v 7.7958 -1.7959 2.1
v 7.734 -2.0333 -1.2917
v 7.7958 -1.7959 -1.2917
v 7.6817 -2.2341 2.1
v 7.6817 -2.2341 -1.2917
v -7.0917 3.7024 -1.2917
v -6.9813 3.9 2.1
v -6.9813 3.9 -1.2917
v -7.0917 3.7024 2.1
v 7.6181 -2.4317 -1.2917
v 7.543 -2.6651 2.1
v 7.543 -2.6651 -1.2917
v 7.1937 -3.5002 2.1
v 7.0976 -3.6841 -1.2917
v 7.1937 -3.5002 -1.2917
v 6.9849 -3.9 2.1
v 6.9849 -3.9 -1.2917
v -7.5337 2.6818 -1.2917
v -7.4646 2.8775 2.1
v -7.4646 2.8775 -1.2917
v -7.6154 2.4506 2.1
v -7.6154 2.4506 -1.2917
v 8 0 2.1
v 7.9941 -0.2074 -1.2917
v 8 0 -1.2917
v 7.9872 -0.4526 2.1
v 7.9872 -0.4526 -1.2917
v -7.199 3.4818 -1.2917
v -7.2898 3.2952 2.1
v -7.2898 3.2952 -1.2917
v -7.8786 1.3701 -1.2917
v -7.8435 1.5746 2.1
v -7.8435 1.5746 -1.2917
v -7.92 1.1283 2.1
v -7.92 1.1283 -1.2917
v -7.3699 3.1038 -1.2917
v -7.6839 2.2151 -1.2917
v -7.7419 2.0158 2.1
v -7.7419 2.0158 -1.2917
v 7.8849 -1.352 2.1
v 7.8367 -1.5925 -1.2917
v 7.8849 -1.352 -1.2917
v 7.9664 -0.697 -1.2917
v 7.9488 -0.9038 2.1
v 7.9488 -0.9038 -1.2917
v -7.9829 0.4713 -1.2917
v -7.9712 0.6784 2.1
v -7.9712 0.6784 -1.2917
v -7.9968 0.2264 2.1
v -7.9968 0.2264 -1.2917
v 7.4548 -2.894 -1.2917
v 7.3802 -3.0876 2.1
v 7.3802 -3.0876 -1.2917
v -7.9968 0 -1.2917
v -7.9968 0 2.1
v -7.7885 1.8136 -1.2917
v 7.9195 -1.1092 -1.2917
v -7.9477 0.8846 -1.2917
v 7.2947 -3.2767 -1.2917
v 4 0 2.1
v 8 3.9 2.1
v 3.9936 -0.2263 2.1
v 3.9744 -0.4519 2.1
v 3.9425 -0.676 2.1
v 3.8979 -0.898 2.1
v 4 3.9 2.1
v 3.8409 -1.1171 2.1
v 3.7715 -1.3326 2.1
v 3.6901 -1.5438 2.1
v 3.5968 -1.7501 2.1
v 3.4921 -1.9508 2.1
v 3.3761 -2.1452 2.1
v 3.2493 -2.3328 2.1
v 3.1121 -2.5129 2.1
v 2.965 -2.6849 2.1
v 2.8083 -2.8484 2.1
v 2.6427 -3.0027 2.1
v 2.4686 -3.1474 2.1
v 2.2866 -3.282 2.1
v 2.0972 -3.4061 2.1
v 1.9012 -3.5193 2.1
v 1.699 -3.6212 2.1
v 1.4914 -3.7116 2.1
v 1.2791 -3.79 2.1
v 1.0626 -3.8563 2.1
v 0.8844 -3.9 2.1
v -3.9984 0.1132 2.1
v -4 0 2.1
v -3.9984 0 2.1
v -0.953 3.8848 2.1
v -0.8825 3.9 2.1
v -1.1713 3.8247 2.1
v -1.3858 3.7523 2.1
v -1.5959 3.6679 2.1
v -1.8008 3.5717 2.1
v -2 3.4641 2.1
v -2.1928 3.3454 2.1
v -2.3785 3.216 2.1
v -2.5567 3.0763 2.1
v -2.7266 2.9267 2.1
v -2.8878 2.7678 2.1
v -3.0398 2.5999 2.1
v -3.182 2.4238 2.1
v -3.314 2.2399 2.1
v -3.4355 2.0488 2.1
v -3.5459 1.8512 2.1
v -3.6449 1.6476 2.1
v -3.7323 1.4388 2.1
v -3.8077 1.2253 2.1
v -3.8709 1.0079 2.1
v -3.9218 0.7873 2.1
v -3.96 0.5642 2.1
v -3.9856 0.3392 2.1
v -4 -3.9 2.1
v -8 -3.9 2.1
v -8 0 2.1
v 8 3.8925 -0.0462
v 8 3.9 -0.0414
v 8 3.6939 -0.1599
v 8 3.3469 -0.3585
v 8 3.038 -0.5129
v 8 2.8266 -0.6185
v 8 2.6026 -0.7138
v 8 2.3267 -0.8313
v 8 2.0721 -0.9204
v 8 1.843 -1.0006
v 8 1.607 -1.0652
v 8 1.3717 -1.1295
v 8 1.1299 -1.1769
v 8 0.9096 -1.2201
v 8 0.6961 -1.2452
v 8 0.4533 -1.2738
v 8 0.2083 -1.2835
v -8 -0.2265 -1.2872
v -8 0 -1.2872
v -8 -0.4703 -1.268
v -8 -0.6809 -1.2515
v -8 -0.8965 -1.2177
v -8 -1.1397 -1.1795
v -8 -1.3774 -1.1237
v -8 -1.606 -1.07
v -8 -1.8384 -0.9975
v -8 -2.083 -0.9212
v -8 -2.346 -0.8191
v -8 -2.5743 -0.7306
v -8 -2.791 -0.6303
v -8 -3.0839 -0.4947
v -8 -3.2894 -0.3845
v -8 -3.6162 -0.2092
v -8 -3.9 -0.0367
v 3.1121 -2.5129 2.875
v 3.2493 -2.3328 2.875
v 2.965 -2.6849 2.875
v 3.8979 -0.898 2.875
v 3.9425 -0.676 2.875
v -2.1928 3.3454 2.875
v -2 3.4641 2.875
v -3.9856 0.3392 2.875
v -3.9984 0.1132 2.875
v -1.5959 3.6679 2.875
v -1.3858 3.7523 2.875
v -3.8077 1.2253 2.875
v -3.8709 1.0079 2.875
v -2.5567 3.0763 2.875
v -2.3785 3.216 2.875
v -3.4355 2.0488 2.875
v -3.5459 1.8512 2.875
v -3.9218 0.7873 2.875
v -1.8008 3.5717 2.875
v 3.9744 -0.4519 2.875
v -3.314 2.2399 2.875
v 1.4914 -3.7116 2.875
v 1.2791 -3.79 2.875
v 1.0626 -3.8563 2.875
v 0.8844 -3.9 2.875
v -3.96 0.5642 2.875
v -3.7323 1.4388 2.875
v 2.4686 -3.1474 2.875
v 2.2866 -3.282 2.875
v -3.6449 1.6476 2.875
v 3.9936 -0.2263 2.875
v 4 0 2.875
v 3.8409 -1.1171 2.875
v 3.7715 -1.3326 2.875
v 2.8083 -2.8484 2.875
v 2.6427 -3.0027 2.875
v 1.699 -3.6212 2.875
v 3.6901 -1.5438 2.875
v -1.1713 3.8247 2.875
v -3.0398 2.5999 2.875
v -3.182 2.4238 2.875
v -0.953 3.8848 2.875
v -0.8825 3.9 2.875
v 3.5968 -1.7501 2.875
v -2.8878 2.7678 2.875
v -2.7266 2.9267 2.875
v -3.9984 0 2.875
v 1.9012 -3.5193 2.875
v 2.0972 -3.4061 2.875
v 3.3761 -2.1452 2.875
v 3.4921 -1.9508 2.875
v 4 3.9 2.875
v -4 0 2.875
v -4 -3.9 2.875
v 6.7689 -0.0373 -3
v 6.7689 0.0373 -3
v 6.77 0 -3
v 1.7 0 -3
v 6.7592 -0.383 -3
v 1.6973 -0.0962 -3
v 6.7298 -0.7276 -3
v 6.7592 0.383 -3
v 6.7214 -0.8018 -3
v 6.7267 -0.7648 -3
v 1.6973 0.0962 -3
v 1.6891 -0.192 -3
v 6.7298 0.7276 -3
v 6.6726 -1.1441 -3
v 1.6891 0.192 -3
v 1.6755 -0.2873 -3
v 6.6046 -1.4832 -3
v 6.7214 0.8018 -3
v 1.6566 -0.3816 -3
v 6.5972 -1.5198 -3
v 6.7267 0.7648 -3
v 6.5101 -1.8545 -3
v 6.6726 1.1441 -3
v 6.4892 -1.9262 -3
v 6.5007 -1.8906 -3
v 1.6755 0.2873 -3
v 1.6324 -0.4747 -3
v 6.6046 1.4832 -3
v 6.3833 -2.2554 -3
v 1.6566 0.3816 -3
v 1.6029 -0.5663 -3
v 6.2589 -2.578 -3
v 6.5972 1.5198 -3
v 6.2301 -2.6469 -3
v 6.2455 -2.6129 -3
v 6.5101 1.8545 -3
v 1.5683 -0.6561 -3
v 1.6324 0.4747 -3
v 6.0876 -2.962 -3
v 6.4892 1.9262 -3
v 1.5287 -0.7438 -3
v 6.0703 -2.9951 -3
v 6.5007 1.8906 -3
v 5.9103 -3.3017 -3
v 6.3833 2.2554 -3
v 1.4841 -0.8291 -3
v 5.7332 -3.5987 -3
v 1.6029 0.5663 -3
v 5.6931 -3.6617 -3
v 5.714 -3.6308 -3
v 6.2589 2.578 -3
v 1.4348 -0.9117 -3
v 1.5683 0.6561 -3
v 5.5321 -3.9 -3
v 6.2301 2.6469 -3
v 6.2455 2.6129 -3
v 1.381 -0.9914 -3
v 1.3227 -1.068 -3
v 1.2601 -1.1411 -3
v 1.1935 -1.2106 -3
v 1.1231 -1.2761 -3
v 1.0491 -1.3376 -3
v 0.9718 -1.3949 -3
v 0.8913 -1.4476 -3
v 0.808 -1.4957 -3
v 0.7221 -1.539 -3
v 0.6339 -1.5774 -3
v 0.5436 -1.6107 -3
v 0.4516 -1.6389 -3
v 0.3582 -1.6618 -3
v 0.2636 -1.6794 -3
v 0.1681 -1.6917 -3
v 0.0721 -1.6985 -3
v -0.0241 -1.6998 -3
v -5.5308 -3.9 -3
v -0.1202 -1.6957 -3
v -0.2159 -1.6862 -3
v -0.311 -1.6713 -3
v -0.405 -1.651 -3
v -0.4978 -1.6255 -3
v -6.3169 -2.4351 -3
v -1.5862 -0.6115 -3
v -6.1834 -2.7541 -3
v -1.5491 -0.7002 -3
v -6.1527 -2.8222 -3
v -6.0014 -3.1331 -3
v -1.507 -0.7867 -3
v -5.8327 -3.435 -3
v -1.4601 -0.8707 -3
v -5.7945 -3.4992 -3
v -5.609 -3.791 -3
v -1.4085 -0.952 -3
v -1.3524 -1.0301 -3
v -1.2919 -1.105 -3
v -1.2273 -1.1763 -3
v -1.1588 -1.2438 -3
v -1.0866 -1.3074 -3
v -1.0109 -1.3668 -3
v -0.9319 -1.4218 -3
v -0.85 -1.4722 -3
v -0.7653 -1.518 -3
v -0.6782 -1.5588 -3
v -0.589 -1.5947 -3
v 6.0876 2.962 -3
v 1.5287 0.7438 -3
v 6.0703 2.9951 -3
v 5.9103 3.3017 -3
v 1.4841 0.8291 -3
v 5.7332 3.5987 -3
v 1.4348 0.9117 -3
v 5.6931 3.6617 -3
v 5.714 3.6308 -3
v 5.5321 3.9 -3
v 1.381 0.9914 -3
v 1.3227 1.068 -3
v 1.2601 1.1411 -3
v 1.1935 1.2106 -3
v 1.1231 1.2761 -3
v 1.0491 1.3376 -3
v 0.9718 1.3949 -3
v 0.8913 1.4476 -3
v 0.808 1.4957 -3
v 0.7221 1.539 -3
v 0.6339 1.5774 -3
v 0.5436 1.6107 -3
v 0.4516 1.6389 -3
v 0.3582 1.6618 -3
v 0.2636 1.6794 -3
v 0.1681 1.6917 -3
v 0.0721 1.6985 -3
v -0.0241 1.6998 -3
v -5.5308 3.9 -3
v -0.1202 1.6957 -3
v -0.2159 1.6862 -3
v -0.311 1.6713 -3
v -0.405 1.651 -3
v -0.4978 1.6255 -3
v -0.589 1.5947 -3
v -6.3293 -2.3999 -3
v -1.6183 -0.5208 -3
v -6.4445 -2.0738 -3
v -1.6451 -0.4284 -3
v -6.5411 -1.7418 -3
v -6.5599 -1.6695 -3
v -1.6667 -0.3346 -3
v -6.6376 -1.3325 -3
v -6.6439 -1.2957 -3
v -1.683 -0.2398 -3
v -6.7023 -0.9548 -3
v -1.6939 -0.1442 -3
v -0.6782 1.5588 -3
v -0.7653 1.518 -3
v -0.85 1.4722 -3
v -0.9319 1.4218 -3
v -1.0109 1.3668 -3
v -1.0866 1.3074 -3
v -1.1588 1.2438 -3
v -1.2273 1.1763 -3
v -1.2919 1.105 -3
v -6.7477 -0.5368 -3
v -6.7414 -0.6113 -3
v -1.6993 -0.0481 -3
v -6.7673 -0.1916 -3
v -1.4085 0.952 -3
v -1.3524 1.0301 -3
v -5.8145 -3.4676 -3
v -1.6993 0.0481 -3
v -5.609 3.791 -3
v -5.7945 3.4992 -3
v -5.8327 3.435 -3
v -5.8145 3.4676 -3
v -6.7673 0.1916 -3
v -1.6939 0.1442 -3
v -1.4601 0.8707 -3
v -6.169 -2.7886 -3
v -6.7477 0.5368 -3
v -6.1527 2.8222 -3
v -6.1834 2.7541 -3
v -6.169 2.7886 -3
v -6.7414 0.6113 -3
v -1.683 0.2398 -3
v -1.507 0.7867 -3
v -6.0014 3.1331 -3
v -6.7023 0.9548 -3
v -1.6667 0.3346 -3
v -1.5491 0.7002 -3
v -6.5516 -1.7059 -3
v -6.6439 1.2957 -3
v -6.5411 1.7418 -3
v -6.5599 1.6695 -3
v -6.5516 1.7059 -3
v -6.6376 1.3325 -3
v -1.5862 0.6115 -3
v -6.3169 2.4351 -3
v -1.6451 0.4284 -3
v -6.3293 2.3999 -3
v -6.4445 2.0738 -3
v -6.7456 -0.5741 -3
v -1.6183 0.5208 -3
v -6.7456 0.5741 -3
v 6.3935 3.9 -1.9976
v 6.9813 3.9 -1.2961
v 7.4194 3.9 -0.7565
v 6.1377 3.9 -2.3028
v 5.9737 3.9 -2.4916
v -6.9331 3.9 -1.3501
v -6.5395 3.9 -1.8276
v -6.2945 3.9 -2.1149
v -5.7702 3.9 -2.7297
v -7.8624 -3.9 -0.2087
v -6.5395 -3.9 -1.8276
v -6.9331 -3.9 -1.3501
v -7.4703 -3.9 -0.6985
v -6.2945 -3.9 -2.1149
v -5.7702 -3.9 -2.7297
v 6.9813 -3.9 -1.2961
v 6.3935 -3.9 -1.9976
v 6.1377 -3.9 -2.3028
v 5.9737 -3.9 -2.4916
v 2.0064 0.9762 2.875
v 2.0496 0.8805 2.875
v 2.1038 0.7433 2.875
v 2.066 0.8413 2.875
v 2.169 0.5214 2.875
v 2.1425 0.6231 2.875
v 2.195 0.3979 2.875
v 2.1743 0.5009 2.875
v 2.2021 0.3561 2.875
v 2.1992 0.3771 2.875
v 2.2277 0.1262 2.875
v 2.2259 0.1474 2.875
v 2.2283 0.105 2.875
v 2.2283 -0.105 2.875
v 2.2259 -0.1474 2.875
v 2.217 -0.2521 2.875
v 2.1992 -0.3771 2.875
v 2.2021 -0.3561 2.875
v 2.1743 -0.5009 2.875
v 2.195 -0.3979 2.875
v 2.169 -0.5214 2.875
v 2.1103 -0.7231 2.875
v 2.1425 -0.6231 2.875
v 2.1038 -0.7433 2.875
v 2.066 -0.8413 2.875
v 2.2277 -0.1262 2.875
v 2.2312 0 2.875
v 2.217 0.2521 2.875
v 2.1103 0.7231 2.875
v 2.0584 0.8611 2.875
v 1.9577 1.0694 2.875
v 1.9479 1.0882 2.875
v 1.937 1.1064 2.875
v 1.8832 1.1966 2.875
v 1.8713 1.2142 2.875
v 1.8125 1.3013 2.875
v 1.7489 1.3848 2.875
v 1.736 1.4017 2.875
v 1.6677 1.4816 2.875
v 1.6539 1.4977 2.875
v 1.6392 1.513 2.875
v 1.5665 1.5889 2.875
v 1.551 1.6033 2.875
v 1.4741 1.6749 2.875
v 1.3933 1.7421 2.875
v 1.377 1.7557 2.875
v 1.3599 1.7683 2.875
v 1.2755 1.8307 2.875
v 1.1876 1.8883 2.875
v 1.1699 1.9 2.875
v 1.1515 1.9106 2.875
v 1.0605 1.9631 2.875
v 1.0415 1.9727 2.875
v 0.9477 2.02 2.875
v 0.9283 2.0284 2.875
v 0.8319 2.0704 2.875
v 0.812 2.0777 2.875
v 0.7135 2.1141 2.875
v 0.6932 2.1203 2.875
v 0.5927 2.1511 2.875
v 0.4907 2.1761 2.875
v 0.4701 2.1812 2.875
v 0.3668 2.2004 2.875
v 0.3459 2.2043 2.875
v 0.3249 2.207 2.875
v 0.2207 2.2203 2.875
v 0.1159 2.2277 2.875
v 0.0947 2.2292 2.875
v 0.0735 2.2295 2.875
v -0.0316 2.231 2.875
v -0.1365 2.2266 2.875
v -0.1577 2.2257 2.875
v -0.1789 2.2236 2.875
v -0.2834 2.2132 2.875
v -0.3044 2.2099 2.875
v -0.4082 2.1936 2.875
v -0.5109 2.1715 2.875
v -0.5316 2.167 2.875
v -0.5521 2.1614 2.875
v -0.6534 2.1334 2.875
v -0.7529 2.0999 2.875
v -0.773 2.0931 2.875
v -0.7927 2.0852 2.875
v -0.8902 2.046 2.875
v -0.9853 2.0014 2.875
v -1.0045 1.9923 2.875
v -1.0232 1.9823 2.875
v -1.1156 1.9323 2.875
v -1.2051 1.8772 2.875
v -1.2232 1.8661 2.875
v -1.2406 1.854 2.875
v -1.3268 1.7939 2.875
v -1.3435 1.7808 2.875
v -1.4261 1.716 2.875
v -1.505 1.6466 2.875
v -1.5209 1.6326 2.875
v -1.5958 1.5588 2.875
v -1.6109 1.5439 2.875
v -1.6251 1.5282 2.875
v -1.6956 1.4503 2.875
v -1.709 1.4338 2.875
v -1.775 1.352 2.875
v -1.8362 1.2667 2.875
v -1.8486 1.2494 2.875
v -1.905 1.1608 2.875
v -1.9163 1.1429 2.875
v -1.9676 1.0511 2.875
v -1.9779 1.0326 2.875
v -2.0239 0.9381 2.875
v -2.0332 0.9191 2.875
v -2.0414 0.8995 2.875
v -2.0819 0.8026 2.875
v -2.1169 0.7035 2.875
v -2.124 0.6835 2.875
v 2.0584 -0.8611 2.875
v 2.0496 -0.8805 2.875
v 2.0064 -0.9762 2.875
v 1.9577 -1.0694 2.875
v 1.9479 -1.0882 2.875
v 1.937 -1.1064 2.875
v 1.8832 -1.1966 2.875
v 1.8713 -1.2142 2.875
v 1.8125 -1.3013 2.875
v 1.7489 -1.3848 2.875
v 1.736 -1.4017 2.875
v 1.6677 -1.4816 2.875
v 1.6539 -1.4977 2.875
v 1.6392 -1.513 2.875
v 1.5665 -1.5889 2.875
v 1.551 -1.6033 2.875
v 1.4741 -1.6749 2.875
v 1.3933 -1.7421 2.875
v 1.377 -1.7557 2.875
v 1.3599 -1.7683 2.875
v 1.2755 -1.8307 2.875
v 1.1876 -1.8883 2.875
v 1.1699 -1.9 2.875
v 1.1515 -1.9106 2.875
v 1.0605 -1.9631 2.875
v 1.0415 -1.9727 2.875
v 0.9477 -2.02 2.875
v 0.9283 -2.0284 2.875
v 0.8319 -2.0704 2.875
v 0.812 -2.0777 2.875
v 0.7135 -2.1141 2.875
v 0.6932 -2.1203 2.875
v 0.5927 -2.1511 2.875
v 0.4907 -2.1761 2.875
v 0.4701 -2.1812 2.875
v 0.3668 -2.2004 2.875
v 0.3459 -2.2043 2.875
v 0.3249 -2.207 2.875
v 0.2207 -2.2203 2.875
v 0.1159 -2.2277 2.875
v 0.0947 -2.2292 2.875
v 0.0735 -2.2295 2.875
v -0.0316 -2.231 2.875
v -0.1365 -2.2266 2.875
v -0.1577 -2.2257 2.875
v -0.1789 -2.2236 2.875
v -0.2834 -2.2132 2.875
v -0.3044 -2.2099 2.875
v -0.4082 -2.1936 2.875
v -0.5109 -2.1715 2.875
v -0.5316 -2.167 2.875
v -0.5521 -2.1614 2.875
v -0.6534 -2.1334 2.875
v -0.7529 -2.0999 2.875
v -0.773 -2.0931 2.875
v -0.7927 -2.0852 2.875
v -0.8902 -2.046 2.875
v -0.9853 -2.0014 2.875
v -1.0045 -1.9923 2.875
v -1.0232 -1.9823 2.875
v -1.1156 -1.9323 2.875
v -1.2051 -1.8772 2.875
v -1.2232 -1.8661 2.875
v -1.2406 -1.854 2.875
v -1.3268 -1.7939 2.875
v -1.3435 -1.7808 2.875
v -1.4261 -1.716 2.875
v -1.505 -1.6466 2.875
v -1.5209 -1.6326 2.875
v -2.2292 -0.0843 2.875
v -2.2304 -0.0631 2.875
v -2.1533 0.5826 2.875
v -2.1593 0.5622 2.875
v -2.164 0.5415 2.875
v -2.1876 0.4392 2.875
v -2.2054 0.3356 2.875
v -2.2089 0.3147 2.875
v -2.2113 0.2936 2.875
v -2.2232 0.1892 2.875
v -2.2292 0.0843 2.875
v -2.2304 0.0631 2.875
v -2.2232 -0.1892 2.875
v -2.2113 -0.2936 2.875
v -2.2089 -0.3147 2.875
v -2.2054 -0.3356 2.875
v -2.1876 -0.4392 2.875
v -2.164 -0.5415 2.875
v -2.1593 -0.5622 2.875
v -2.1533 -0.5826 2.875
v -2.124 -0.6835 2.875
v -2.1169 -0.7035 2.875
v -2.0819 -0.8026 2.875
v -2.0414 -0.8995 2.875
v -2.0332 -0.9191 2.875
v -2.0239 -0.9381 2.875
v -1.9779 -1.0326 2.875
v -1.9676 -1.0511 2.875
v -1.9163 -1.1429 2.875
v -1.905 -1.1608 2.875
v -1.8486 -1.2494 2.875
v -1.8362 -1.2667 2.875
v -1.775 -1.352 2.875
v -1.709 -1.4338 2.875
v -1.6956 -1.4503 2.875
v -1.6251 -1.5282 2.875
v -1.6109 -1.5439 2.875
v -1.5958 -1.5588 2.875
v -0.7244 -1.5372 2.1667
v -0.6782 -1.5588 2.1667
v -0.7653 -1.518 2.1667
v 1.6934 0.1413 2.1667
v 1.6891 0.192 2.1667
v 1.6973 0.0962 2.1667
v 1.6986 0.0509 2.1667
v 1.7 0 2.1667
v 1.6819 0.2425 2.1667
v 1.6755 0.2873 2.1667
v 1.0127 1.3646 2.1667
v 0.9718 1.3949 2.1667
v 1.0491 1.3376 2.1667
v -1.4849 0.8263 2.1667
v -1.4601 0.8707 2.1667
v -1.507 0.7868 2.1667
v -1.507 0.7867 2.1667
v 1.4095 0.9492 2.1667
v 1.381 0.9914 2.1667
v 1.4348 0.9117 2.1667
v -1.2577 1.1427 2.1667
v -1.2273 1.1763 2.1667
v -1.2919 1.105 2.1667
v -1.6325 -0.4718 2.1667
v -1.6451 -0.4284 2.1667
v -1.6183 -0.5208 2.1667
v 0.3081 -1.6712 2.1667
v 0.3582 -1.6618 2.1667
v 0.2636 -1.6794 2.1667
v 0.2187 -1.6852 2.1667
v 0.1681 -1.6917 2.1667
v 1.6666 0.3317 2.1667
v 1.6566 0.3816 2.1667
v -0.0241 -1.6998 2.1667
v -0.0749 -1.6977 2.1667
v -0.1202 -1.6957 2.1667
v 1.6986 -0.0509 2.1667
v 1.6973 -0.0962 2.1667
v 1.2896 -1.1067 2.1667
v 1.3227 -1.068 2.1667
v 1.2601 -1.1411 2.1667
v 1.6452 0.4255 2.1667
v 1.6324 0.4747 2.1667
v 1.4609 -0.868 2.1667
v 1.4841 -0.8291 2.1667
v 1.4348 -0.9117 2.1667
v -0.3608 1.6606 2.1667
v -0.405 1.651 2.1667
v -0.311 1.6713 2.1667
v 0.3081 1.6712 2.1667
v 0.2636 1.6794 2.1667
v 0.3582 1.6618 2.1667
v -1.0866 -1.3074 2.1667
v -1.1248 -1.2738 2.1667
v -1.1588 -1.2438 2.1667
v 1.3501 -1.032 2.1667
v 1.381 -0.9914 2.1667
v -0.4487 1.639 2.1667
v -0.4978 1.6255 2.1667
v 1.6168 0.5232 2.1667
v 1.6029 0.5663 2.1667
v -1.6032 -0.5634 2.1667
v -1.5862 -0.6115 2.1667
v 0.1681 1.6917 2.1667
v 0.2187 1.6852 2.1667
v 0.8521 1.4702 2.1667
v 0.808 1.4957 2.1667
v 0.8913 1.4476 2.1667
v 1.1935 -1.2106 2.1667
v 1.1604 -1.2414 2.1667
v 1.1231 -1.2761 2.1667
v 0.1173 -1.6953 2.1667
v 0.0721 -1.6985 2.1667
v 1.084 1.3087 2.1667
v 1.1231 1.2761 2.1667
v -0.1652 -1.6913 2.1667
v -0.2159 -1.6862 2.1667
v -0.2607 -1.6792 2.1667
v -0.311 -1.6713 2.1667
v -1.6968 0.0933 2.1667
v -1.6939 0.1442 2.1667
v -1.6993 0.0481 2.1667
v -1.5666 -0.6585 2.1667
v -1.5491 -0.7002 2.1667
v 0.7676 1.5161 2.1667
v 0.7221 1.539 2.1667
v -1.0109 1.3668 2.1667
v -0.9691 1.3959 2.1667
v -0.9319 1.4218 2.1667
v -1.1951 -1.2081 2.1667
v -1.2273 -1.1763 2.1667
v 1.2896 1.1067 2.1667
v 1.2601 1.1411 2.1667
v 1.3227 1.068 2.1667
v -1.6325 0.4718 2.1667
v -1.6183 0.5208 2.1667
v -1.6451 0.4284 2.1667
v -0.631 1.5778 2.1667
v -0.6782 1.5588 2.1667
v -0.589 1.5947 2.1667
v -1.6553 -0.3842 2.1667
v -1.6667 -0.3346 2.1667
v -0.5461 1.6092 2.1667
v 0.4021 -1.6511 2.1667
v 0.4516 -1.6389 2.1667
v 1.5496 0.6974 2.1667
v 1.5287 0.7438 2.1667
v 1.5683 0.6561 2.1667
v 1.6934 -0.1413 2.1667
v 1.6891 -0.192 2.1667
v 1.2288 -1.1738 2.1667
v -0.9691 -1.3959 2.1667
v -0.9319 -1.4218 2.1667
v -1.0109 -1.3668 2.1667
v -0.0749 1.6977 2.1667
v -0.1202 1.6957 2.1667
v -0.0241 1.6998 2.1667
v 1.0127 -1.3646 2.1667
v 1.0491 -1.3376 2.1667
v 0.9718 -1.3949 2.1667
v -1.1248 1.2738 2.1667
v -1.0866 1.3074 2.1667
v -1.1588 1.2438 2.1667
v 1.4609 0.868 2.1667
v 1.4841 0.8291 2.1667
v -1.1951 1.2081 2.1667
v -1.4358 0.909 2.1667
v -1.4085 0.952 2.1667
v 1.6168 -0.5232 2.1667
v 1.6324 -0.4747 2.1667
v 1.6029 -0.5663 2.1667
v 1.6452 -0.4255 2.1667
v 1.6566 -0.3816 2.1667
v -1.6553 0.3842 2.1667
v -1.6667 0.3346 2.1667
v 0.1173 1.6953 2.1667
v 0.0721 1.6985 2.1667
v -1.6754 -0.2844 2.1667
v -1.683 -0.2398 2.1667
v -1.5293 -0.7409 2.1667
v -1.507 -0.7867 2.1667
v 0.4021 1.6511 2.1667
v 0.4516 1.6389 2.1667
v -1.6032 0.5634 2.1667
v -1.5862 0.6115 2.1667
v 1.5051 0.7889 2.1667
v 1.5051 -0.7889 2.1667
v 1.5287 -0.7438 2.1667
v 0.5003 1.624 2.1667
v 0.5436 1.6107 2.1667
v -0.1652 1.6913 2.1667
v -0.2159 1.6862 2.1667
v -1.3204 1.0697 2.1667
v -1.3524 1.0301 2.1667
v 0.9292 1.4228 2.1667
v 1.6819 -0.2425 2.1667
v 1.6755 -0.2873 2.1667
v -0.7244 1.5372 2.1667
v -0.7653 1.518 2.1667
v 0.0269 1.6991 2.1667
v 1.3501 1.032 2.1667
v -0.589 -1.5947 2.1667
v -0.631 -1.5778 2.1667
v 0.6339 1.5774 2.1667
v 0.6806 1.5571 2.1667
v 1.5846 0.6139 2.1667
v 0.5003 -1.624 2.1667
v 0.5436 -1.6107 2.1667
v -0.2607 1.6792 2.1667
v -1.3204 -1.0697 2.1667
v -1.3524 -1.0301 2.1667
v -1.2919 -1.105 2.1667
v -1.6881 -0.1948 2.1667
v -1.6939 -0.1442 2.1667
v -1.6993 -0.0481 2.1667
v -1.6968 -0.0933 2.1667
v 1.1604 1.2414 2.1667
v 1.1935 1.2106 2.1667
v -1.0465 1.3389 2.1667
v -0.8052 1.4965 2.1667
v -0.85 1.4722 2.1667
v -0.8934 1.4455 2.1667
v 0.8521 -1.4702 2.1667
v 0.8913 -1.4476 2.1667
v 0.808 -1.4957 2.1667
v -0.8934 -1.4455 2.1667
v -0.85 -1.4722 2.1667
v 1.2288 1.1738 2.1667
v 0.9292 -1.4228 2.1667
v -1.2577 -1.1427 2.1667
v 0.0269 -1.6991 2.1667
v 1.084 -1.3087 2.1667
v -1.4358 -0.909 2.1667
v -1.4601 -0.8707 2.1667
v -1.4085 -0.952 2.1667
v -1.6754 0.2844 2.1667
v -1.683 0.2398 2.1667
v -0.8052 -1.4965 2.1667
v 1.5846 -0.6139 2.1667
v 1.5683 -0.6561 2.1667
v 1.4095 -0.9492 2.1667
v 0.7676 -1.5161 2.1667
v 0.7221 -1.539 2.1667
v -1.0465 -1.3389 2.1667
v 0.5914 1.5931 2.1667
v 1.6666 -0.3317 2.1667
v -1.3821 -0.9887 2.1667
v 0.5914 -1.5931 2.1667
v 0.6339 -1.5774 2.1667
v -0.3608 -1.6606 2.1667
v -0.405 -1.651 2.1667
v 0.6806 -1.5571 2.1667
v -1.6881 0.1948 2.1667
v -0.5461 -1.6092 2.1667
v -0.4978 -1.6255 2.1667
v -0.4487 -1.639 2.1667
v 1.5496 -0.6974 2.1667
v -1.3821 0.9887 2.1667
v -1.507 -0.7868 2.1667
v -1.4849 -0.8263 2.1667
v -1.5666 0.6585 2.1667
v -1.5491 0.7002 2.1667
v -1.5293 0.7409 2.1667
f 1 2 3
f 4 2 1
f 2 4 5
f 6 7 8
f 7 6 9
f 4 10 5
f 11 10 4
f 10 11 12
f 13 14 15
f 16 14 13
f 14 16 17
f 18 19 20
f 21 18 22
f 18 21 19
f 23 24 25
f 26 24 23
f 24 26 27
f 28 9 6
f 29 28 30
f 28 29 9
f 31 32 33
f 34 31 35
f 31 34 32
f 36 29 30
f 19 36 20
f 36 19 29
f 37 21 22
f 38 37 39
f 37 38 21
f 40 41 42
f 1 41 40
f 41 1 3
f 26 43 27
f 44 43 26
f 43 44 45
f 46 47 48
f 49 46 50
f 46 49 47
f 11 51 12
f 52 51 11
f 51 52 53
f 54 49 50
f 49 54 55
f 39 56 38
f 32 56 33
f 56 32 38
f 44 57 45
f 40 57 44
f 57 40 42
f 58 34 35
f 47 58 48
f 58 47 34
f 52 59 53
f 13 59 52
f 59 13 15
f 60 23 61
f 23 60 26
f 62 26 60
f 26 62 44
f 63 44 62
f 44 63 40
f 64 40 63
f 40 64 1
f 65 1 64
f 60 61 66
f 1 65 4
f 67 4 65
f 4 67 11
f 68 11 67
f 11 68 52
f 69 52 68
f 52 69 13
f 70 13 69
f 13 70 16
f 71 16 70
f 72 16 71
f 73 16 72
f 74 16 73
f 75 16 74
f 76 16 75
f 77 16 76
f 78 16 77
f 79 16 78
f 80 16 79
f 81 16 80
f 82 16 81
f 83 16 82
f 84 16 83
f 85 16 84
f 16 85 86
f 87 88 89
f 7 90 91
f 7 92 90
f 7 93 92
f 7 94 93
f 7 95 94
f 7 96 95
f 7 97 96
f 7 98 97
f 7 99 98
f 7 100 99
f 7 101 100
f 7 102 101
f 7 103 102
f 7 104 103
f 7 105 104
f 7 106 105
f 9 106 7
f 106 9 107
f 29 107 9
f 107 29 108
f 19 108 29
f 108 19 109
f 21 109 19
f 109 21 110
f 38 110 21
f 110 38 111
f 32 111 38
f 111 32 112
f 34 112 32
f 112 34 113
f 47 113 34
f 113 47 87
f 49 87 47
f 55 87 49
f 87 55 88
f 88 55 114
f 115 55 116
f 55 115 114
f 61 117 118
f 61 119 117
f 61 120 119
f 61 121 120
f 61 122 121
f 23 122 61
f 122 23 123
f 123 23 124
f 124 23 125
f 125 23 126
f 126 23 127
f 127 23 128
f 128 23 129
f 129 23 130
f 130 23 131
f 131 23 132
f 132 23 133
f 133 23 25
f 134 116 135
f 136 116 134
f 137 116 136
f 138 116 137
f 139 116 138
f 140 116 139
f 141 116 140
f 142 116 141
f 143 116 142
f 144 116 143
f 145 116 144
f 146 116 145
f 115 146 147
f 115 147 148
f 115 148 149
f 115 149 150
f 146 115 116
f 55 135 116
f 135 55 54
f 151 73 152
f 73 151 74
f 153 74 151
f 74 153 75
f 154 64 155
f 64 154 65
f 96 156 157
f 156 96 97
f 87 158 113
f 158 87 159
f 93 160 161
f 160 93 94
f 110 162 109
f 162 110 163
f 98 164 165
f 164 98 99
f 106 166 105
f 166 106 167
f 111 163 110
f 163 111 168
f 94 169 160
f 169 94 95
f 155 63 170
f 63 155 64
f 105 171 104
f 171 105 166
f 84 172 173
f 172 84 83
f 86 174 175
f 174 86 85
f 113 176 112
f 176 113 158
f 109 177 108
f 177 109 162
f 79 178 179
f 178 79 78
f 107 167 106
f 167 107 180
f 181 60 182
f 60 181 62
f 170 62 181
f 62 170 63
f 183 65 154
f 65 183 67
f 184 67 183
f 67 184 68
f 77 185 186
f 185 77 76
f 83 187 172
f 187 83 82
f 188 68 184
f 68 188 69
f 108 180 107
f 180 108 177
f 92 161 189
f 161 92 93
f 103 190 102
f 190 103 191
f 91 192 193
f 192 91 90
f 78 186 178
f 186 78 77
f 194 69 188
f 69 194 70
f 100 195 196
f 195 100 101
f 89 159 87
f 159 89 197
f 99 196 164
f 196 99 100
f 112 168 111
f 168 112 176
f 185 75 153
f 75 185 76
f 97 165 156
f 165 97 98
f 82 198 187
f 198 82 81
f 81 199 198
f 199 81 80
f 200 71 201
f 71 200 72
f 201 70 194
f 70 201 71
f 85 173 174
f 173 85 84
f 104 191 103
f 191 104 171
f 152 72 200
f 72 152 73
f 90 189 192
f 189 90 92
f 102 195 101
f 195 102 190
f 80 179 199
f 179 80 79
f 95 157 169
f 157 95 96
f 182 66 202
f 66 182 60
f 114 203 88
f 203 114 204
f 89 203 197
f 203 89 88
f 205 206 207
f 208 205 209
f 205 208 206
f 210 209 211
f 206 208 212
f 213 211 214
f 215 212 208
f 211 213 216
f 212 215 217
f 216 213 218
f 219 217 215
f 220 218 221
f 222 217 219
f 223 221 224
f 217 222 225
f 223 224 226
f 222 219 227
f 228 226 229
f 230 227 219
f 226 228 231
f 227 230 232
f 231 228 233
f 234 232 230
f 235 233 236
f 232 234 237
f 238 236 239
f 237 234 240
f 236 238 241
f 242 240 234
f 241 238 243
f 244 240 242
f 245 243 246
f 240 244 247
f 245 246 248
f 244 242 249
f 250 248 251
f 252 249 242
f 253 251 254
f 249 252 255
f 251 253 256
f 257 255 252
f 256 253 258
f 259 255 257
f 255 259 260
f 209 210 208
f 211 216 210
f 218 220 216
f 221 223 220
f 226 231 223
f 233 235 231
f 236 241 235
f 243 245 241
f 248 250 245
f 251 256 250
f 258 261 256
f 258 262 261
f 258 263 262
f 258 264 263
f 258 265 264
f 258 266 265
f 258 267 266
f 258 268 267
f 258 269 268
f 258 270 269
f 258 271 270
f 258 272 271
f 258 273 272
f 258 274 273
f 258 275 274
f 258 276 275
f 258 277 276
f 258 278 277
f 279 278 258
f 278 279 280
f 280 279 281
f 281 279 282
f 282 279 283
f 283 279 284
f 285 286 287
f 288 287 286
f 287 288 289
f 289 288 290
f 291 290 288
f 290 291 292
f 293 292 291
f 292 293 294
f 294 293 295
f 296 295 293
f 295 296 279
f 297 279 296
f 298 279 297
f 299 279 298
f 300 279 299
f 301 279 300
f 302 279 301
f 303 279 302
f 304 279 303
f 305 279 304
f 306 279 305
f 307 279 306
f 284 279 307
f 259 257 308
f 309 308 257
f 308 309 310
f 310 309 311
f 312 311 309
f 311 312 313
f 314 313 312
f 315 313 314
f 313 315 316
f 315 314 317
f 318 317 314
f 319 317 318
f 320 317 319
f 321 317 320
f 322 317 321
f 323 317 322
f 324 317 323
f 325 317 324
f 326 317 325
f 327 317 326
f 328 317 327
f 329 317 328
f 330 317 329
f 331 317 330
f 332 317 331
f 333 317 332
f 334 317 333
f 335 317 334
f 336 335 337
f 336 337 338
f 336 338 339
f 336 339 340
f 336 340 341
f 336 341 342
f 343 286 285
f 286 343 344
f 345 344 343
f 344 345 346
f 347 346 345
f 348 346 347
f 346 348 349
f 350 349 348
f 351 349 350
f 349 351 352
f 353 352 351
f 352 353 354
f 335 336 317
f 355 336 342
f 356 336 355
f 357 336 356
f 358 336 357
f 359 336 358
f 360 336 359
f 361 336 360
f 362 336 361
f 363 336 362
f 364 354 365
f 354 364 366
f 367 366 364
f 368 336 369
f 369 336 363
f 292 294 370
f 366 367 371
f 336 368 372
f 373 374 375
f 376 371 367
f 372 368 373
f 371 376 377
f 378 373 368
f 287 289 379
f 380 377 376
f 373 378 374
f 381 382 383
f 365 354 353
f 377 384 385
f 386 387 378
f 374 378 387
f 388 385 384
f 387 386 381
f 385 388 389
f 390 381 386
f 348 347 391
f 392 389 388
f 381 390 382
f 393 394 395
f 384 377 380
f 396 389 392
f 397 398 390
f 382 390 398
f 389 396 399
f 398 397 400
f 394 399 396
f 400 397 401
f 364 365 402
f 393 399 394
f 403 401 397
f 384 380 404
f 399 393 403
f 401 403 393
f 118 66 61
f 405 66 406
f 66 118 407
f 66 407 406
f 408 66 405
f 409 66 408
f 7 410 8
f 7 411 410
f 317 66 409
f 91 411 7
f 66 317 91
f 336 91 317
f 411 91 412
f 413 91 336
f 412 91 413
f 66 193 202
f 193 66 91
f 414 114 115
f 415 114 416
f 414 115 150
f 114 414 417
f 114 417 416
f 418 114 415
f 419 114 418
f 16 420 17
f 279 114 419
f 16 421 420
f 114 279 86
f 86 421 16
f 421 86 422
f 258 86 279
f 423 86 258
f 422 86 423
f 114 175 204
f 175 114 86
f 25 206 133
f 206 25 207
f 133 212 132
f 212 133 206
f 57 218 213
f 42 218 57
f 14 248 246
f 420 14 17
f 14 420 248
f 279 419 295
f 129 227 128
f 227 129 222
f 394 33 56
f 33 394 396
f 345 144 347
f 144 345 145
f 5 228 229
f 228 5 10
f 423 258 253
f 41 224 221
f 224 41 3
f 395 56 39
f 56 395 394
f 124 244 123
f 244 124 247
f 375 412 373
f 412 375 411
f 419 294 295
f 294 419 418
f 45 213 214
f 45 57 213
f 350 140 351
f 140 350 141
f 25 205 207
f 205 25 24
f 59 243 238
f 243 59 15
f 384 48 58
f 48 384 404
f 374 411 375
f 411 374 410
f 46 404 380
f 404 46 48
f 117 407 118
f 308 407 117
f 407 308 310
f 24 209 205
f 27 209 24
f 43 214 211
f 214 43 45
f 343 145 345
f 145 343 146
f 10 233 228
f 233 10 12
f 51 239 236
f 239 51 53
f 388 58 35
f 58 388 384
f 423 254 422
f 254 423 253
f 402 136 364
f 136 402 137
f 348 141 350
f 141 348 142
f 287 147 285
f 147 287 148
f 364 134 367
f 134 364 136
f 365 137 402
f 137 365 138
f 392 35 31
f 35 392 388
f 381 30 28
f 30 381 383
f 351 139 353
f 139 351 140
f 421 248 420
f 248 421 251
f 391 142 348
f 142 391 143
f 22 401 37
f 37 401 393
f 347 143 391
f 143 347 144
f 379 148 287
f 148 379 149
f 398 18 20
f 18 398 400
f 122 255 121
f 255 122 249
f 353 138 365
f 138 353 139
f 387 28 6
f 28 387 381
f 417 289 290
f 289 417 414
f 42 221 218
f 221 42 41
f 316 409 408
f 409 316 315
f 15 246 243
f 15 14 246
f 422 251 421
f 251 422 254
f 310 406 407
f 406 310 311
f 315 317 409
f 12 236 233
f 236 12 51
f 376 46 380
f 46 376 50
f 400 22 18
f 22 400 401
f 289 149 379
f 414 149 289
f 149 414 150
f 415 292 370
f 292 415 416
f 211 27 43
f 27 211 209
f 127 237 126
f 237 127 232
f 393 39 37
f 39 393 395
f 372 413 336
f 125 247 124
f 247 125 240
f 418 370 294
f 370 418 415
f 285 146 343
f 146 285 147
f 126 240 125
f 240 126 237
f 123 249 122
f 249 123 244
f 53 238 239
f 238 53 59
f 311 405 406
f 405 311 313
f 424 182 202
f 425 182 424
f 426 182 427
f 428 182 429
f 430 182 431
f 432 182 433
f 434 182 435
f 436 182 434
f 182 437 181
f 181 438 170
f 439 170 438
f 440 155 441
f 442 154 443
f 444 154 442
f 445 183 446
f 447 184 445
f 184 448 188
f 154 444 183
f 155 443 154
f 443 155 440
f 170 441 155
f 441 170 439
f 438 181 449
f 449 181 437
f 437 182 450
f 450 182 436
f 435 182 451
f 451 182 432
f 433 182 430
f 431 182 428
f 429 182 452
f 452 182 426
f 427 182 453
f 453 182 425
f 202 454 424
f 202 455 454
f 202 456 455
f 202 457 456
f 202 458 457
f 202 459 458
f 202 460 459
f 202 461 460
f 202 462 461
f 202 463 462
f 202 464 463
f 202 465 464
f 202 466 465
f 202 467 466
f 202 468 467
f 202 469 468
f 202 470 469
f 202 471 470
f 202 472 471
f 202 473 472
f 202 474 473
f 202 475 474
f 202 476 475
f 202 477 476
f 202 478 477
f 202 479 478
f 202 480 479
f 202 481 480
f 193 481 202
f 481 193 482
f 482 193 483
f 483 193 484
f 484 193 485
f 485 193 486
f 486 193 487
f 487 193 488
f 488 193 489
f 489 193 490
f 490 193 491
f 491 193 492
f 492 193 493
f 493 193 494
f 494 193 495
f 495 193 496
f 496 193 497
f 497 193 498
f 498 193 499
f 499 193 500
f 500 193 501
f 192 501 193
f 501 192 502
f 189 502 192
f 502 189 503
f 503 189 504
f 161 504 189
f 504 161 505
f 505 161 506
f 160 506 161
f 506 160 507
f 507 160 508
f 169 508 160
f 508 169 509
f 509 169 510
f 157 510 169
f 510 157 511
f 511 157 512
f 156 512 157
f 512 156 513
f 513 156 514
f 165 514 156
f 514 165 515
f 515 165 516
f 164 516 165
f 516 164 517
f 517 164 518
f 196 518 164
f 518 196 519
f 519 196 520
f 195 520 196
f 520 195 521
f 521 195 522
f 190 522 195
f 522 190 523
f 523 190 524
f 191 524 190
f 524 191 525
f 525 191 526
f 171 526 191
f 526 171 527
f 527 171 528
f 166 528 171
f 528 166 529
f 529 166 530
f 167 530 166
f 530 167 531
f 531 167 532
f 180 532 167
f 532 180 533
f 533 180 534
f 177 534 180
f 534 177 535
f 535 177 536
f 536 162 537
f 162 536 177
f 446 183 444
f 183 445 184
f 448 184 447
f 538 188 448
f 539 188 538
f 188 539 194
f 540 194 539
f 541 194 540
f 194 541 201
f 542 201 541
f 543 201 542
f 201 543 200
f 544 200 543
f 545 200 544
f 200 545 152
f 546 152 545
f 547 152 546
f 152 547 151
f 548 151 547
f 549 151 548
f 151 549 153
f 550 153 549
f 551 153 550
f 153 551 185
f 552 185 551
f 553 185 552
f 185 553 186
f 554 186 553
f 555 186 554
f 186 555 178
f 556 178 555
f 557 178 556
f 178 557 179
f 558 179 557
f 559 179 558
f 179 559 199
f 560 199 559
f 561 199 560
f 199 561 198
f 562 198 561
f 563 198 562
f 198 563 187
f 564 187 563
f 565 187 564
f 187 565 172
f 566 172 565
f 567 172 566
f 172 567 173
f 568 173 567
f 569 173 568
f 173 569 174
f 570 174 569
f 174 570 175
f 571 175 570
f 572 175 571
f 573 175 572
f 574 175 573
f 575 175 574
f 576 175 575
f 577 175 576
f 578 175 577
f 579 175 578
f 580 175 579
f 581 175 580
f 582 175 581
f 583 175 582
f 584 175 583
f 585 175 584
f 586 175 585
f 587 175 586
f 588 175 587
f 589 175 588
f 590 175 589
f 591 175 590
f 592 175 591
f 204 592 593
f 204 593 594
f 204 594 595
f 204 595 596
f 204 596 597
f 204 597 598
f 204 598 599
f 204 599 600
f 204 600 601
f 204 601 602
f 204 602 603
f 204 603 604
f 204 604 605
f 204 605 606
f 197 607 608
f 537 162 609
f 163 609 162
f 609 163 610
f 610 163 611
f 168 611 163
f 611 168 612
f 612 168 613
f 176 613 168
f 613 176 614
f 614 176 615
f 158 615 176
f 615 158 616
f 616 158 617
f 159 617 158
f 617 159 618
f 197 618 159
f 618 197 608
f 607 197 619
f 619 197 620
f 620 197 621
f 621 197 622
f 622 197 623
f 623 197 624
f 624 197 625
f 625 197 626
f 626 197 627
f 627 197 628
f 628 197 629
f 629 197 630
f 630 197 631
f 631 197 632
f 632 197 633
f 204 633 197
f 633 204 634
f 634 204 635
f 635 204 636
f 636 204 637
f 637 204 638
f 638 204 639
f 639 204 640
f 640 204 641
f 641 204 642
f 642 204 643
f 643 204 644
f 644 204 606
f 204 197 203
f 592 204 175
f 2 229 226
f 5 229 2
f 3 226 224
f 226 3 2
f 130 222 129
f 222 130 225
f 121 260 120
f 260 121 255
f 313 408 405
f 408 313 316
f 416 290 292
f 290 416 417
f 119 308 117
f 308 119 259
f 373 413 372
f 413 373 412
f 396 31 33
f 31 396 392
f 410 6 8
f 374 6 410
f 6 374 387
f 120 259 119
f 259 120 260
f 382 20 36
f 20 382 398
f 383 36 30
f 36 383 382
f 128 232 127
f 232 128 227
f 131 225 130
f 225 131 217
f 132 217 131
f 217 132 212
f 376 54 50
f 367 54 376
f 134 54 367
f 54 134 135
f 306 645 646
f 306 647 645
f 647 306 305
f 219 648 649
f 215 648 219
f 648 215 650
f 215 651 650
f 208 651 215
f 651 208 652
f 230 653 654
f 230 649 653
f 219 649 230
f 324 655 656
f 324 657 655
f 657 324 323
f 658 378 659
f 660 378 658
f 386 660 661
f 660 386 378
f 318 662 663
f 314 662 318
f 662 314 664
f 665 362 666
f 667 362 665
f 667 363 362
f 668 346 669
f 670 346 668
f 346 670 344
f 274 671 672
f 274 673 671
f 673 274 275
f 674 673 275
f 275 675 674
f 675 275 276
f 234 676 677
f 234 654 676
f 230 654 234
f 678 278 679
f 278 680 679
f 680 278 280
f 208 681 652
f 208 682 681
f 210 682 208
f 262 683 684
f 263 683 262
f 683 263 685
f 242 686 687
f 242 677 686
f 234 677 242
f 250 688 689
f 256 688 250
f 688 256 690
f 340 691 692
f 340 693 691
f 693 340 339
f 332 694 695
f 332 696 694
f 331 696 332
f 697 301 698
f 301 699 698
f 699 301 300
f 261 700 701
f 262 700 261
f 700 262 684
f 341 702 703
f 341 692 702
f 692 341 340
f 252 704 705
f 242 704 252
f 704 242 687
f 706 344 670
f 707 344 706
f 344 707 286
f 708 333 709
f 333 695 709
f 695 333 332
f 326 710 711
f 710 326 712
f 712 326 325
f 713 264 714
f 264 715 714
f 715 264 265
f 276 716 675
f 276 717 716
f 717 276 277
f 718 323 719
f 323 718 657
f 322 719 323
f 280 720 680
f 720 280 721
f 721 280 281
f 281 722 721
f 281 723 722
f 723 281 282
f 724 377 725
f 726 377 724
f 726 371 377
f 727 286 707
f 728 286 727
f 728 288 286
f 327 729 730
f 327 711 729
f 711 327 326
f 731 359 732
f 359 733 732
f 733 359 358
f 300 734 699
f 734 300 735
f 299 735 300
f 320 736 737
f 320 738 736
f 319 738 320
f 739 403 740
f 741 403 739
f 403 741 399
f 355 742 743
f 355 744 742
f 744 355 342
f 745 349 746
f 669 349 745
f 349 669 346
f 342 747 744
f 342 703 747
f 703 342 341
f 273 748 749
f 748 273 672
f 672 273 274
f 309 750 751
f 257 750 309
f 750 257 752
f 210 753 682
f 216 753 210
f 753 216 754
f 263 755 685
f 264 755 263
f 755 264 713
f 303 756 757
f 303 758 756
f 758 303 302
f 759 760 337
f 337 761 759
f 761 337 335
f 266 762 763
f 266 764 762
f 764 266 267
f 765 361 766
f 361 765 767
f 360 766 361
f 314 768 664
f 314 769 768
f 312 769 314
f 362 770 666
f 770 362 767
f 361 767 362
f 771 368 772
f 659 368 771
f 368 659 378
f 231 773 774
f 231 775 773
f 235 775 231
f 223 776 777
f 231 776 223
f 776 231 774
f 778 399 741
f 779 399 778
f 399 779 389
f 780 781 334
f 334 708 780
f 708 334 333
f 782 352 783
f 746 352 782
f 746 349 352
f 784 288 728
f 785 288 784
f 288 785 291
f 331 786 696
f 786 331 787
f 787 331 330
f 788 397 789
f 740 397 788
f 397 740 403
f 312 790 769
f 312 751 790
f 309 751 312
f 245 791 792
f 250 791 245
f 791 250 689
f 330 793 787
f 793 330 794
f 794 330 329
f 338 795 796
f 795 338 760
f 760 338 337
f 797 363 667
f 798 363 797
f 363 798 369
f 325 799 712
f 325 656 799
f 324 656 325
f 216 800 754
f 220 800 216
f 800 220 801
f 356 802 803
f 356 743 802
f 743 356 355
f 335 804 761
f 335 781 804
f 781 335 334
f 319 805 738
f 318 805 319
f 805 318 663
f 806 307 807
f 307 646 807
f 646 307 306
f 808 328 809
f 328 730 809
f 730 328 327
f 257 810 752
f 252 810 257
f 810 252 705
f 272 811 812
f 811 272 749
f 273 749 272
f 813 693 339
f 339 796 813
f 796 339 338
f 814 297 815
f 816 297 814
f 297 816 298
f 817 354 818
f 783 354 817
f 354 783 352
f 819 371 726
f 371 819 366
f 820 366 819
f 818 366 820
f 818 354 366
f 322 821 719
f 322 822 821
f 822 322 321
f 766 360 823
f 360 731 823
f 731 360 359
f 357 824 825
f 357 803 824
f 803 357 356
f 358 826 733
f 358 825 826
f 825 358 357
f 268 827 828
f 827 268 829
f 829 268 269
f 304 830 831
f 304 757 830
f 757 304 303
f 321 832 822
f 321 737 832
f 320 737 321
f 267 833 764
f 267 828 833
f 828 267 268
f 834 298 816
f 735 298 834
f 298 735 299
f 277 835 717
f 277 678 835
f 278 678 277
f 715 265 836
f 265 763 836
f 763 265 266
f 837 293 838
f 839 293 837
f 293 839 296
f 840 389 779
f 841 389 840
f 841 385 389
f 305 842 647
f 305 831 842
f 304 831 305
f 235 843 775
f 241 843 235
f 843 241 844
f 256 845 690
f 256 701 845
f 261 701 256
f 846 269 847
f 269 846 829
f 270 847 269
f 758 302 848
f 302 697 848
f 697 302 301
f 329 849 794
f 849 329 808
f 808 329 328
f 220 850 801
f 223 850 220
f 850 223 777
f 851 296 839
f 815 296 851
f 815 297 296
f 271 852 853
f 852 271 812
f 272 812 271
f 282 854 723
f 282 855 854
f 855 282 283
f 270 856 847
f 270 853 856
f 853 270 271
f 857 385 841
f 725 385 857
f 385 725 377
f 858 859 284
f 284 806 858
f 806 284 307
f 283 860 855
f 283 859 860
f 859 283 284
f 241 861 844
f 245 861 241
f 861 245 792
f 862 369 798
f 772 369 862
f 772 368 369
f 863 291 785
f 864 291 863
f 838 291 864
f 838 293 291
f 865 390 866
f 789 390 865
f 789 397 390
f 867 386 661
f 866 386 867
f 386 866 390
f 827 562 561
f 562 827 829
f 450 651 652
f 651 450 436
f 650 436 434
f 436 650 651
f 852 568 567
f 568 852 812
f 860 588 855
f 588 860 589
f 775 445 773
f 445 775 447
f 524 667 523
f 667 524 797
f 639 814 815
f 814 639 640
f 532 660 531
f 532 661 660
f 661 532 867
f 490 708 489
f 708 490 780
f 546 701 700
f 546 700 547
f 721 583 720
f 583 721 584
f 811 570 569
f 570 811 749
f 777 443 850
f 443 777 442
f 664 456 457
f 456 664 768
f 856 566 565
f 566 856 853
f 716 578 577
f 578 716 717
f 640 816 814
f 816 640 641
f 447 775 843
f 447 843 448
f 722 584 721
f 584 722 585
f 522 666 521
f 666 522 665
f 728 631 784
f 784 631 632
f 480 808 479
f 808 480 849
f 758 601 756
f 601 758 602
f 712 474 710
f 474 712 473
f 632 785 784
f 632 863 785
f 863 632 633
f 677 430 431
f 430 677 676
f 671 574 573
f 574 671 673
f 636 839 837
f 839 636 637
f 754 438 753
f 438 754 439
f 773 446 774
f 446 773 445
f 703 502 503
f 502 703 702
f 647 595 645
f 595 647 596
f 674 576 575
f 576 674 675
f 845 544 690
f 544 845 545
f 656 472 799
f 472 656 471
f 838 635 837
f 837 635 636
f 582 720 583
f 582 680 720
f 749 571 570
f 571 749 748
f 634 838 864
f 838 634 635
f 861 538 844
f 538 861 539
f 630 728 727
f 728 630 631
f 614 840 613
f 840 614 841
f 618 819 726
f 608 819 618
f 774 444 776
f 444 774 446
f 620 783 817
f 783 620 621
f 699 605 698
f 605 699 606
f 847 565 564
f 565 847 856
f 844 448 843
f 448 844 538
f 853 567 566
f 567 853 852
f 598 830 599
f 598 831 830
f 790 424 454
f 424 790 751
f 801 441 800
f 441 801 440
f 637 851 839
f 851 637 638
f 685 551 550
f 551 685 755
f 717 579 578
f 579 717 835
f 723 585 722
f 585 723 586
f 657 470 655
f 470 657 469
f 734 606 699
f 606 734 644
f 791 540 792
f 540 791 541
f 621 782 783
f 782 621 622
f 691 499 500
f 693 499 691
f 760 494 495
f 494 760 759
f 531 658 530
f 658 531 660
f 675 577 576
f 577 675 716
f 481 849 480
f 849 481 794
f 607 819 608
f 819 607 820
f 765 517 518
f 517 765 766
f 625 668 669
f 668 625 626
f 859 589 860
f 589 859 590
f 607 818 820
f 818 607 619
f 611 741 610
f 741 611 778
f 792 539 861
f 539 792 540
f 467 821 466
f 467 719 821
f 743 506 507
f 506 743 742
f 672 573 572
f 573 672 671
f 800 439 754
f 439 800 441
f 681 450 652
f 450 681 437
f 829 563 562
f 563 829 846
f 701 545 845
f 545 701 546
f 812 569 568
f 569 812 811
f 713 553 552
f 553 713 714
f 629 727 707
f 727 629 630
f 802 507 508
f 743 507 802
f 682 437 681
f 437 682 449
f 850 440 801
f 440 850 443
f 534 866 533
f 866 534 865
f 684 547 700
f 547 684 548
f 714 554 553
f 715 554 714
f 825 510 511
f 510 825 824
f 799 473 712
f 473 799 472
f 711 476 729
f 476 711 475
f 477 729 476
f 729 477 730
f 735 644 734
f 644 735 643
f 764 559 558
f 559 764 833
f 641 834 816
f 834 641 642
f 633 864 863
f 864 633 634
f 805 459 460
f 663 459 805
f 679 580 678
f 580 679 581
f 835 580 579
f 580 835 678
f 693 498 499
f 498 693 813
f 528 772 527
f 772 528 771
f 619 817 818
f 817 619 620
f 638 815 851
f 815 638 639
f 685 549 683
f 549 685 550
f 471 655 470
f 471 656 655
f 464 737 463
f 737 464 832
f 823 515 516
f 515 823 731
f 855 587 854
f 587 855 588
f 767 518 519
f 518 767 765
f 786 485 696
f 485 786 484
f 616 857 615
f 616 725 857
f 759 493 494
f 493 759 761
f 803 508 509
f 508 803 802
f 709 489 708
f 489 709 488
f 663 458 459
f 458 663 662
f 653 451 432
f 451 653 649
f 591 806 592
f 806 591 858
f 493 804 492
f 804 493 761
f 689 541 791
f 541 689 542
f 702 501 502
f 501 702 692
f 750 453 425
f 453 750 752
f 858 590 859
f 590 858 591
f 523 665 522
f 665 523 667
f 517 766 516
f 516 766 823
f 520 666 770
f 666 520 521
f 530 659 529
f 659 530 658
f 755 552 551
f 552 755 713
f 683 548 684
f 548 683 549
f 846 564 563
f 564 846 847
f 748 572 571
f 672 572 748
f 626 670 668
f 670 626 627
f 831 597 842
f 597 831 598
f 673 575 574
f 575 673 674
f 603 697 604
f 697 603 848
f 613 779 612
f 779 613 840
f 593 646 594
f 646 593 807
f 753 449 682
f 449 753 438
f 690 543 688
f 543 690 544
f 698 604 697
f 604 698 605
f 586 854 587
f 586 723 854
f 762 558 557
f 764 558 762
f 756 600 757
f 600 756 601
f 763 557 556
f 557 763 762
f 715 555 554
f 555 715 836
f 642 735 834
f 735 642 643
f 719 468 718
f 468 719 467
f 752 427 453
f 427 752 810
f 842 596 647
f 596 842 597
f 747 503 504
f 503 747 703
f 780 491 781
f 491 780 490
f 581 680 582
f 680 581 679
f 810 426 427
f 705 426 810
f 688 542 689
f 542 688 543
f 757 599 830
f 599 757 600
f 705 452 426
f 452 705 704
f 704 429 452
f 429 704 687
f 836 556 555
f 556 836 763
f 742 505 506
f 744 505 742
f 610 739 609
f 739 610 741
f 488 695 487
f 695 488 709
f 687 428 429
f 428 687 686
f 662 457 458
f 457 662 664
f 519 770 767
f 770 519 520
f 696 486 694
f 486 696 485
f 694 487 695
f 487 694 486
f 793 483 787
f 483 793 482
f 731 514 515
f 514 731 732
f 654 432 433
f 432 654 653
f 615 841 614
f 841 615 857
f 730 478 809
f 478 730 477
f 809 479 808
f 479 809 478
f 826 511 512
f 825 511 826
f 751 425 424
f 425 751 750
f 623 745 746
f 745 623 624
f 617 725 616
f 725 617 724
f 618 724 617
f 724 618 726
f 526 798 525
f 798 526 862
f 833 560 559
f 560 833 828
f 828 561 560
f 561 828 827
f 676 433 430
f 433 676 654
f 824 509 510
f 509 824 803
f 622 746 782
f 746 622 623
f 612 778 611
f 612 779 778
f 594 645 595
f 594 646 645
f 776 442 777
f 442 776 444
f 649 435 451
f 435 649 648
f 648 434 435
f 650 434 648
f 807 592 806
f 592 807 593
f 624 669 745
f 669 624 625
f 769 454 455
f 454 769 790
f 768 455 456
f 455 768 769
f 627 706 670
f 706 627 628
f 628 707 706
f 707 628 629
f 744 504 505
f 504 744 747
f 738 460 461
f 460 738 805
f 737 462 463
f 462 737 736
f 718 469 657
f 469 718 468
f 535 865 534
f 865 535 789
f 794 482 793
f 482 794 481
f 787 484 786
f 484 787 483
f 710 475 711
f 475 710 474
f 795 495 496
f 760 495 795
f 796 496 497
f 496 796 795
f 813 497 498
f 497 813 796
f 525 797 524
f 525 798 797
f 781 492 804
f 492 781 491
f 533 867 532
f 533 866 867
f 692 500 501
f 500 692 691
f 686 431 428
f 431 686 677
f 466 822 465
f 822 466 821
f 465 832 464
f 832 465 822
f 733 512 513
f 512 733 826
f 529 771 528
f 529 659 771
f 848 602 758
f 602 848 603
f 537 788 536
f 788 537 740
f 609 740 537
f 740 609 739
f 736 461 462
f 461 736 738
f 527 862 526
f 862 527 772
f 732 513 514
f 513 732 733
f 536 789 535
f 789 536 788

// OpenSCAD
// Aufloesung von Kugeln und Zylindern
$fn=111;

// Spiel in der Nut
eps=0.2;  // [0,.1,.2,.3,.4,.5,.6]

// Gewindenenndurchmesser. Sinnvolle kombinationen: P20 und 2.4 bis 4, P30 und 4 bis 6 
m=4; // [2.4,3,4,5,6]
// Profilnennweite
p=30; // [20,30]

nutStone(p, m);

/*
translate ( [ 0,  0,0] ) nutStone(20, 2.4);
translate ( [ 0, 10,0] ) nutStone(20, 3);
translate ( [ 0, 20,0] ) nutStone(20, 4);
translate ( [ 0, 30,0] ) nutStone(20, 5);

translate ( [15,  0,0] ) nutStone(30, 3);
translate ( [15, 10,0] ) nutStone(30, 4);
translate ( [15, 20,0] ) nutStone(30, 5);
translate ( [15, 30,0] ) nutStone(30, 6);
*/

module nutStone(p=20, m=3) {
    b=m*.85; // +.24;
    difference(){
        if (p==20) { stone20(); } else { stone30(); }
        translate ( [ 0, 0,   0] ) cylinder ( d =b,           h=10, center = true); 
        translate ( [ 0, 0, 5/2] ) cylinder ( d1=b-1, d2=b+2, h= 2, center = true); 
    }
}

module stone20(){
    color("lightgray") {
        b=m*.85; // +.24;
        intersection(){
            intersection(){
                difference(){
                    union(){
                        cylinder ( d=10, h=3.4, center = true);
                        translate ( [ 0, 0, 0] ){
                            cylinder(d=6, h=4.4, center = true);
                            translate ( [ 5/2, 3/2, 0] ) cube     ( [5, 3, 3.4], center = true);
                            translate ( [-5/2,-3/2, 0] ) cube     ( [5, 3, 3.4], center = true);
                            }
                        translate ( [ 0, 0, .5] ){
                            cylinder(d=6, h=4.4, center = true);
                            translate ( [ 3/2, 3/2, 0] ) cube     ( [3, 3, 4.4], center = true);
                            translate ( [-3/2,-3/2, 0] ) cube     ( [3, 3, 4.4], center = true);
                            }
                        }
                    }
                translate ( [ 0, 0, .5] ) cube     ( [10, 6-eps, 4.4], center = true);
                }
            translate ( [ 0, 0, .5] )  cylinder ( d1=8, d2=18, h=4.4, center = true);
            }
        }
    }
module stone30(){
    b=m*.85; // +.24;
    color("lightblue") {
        intersection(){
            intersection(){
                difference(){
                    union(){
                        cylinder ( d=16, h=3.4, center = true);
                        translate ( [ 0, 0, 0-.9] ){
                            cylinder(d=16, h=6, center = true);
                            translate ( [ 8/2, 5/2, 0] ) cube     ( [8, 5, 6], center = true);
                            translate ( [-8/2,-5/2, 0] ) cube     ( [8, 5, 6], center = true);
                            }
                        translate ( [ 0, 0, .75] ){
                            cylinder(d=8, h=4.6, center = true);
                            translate ( [ 4/2, 4/2, 0] ) cube     ( [4, 4, 4.4], center = true);
                            translate ( [-4/2,-4/2, 0] ) cube     ( [4, 4, 4.4], center = true);
                            }
                        }
                    }
                translate ( [ 0, 0, 0] ) cube     ( [16, 8-eps, 6], center = true);
                }
            translate ( [ 0, 0, -.25] )  cylinder ( d1=13, d2=22, h=6.25, center = true);
            }
        }
    }
